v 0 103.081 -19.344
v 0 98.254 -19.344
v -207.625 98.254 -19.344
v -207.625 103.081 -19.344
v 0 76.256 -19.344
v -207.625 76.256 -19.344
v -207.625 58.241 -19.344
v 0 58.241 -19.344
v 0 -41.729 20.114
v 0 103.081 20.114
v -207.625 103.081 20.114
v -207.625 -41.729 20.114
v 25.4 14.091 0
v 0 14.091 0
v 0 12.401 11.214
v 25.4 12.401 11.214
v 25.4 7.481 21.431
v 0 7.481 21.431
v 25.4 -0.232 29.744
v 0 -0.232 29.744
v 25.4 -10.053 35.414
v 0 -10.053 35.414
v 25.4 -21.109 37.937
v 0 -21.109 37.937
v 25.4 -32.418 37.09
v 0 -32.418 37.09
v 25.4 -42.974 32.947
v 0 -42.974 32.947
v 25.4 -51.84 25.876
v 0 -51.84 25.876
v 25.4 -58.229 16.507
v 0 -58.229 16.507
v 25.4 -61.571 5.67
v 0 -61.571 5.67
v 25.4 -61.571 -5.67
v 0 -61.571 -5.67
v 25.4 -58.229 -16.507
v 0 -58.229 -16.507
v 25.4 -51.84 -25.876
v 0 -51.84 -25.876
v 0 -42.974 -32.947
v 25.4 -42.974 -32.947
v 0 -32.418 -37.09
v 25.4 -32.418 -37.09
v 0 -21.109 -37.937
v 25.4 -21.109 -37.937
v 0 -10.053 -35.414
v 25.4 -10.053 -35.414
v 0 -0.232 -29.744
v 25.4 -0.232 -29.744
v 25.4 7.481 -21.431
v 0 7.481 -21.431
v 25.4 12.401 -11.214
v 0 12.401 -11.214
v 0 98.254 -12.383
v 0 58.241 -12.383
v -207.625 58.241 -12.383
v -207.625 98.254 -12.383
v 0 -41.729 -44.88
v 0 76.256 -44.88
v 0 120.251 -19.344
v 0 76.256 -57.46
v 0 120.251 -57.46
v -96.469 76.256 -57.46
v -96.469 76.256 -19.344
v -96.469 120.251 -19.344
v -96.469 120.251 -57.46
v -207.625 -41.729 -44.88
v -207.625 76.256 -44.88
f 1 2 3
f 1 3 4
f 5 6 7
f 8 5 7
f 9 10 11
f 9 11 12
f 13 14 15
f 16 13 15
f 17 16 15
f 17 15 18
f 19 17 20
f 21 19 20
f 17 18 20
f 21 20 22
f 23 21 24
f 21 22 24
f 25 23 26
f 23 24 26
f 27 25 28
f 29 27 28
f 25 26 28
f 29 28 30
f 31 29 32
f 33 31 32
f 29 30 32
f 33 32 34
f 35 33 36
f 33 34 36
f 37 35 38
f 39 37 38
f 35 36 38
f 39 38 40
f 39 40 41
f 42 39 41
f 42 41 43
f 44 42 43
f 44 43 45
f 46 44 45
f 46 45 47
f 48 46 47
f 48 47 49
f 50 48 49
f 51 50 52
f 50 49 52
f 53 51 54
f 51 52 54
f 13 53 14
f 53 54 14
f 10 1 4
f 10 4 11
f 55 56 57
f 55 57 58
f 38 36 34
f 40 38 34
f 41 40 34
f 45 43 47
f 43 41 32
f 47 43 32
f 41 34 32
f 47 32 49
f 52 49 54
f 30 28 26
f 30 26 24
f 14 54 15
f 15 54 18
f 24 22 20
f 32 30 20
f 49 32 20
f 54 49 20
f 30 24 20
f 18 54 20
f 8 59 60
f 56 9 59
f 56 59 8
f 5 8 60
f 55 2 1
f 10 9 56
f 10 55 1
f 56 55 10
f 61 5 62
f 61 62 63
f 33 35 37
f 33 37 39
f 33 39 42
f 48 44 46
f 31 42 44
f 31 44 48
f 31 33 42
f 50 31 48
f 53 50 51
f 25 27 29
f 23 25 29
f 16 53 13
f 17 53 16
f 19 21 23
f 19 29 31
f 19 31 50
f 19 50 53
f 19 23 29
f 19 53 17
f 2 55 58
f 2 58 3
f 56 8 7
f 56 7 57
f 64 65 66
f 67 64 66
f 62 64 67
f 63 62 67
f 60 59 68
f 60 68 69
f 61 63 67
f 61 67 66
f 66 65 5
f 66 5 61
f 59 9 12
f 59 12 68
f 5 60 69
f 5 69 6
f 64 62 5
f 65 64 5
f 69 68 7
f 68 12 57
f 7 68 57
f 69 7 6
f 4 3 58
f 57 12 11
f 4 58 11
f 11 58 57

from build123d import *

# Parameters (mm, degrees)
F0_R     = 38.043722
F1_DEPTH = 25.4
F2_W     = 43.994091
F2_H     = 38.116284
F3_DEPTH = 96.468812
F5_DEPTH = 207.62481


with BuildPart() as f1:
    # F0 (on Right) → F1 (new body)
    with BuildSketch(Plane.YZ):
        with Locations((-23.952313, 0)):
            Circle(F0_R)
    extrude(amount=F1_DEPTH)


with BuildPart() as f3:
    # F2 (on Right) → F3 (new body)
    with BuildSketch(Plane.YZ):
        with Locations((98.253499, -38.4023)):
            Rectangle(F2_W, F2_H)
    extrude(amount=-F3_DEPTH)


with BuildPart() as f5:
    # F4 (on face) → F5 (new body)
    with BuildSketch(Plane.YZ):
        Polygon((-41.729145, -44.879589), (76.256454, -44.879589), (76.256454, -19.344158), (58.241405, -19.344158), (58.241405, -12.38269), (98.2535, -12.38269), (98.2535, -19.344158), (103.080533, -19.344158), (103.080533, 20.11421), (-41.729145, 20.11421), align=None)
    extrude(amount=-F5_DEPTH)


solid = Compound([f1.part, f3.part, f5.part])
